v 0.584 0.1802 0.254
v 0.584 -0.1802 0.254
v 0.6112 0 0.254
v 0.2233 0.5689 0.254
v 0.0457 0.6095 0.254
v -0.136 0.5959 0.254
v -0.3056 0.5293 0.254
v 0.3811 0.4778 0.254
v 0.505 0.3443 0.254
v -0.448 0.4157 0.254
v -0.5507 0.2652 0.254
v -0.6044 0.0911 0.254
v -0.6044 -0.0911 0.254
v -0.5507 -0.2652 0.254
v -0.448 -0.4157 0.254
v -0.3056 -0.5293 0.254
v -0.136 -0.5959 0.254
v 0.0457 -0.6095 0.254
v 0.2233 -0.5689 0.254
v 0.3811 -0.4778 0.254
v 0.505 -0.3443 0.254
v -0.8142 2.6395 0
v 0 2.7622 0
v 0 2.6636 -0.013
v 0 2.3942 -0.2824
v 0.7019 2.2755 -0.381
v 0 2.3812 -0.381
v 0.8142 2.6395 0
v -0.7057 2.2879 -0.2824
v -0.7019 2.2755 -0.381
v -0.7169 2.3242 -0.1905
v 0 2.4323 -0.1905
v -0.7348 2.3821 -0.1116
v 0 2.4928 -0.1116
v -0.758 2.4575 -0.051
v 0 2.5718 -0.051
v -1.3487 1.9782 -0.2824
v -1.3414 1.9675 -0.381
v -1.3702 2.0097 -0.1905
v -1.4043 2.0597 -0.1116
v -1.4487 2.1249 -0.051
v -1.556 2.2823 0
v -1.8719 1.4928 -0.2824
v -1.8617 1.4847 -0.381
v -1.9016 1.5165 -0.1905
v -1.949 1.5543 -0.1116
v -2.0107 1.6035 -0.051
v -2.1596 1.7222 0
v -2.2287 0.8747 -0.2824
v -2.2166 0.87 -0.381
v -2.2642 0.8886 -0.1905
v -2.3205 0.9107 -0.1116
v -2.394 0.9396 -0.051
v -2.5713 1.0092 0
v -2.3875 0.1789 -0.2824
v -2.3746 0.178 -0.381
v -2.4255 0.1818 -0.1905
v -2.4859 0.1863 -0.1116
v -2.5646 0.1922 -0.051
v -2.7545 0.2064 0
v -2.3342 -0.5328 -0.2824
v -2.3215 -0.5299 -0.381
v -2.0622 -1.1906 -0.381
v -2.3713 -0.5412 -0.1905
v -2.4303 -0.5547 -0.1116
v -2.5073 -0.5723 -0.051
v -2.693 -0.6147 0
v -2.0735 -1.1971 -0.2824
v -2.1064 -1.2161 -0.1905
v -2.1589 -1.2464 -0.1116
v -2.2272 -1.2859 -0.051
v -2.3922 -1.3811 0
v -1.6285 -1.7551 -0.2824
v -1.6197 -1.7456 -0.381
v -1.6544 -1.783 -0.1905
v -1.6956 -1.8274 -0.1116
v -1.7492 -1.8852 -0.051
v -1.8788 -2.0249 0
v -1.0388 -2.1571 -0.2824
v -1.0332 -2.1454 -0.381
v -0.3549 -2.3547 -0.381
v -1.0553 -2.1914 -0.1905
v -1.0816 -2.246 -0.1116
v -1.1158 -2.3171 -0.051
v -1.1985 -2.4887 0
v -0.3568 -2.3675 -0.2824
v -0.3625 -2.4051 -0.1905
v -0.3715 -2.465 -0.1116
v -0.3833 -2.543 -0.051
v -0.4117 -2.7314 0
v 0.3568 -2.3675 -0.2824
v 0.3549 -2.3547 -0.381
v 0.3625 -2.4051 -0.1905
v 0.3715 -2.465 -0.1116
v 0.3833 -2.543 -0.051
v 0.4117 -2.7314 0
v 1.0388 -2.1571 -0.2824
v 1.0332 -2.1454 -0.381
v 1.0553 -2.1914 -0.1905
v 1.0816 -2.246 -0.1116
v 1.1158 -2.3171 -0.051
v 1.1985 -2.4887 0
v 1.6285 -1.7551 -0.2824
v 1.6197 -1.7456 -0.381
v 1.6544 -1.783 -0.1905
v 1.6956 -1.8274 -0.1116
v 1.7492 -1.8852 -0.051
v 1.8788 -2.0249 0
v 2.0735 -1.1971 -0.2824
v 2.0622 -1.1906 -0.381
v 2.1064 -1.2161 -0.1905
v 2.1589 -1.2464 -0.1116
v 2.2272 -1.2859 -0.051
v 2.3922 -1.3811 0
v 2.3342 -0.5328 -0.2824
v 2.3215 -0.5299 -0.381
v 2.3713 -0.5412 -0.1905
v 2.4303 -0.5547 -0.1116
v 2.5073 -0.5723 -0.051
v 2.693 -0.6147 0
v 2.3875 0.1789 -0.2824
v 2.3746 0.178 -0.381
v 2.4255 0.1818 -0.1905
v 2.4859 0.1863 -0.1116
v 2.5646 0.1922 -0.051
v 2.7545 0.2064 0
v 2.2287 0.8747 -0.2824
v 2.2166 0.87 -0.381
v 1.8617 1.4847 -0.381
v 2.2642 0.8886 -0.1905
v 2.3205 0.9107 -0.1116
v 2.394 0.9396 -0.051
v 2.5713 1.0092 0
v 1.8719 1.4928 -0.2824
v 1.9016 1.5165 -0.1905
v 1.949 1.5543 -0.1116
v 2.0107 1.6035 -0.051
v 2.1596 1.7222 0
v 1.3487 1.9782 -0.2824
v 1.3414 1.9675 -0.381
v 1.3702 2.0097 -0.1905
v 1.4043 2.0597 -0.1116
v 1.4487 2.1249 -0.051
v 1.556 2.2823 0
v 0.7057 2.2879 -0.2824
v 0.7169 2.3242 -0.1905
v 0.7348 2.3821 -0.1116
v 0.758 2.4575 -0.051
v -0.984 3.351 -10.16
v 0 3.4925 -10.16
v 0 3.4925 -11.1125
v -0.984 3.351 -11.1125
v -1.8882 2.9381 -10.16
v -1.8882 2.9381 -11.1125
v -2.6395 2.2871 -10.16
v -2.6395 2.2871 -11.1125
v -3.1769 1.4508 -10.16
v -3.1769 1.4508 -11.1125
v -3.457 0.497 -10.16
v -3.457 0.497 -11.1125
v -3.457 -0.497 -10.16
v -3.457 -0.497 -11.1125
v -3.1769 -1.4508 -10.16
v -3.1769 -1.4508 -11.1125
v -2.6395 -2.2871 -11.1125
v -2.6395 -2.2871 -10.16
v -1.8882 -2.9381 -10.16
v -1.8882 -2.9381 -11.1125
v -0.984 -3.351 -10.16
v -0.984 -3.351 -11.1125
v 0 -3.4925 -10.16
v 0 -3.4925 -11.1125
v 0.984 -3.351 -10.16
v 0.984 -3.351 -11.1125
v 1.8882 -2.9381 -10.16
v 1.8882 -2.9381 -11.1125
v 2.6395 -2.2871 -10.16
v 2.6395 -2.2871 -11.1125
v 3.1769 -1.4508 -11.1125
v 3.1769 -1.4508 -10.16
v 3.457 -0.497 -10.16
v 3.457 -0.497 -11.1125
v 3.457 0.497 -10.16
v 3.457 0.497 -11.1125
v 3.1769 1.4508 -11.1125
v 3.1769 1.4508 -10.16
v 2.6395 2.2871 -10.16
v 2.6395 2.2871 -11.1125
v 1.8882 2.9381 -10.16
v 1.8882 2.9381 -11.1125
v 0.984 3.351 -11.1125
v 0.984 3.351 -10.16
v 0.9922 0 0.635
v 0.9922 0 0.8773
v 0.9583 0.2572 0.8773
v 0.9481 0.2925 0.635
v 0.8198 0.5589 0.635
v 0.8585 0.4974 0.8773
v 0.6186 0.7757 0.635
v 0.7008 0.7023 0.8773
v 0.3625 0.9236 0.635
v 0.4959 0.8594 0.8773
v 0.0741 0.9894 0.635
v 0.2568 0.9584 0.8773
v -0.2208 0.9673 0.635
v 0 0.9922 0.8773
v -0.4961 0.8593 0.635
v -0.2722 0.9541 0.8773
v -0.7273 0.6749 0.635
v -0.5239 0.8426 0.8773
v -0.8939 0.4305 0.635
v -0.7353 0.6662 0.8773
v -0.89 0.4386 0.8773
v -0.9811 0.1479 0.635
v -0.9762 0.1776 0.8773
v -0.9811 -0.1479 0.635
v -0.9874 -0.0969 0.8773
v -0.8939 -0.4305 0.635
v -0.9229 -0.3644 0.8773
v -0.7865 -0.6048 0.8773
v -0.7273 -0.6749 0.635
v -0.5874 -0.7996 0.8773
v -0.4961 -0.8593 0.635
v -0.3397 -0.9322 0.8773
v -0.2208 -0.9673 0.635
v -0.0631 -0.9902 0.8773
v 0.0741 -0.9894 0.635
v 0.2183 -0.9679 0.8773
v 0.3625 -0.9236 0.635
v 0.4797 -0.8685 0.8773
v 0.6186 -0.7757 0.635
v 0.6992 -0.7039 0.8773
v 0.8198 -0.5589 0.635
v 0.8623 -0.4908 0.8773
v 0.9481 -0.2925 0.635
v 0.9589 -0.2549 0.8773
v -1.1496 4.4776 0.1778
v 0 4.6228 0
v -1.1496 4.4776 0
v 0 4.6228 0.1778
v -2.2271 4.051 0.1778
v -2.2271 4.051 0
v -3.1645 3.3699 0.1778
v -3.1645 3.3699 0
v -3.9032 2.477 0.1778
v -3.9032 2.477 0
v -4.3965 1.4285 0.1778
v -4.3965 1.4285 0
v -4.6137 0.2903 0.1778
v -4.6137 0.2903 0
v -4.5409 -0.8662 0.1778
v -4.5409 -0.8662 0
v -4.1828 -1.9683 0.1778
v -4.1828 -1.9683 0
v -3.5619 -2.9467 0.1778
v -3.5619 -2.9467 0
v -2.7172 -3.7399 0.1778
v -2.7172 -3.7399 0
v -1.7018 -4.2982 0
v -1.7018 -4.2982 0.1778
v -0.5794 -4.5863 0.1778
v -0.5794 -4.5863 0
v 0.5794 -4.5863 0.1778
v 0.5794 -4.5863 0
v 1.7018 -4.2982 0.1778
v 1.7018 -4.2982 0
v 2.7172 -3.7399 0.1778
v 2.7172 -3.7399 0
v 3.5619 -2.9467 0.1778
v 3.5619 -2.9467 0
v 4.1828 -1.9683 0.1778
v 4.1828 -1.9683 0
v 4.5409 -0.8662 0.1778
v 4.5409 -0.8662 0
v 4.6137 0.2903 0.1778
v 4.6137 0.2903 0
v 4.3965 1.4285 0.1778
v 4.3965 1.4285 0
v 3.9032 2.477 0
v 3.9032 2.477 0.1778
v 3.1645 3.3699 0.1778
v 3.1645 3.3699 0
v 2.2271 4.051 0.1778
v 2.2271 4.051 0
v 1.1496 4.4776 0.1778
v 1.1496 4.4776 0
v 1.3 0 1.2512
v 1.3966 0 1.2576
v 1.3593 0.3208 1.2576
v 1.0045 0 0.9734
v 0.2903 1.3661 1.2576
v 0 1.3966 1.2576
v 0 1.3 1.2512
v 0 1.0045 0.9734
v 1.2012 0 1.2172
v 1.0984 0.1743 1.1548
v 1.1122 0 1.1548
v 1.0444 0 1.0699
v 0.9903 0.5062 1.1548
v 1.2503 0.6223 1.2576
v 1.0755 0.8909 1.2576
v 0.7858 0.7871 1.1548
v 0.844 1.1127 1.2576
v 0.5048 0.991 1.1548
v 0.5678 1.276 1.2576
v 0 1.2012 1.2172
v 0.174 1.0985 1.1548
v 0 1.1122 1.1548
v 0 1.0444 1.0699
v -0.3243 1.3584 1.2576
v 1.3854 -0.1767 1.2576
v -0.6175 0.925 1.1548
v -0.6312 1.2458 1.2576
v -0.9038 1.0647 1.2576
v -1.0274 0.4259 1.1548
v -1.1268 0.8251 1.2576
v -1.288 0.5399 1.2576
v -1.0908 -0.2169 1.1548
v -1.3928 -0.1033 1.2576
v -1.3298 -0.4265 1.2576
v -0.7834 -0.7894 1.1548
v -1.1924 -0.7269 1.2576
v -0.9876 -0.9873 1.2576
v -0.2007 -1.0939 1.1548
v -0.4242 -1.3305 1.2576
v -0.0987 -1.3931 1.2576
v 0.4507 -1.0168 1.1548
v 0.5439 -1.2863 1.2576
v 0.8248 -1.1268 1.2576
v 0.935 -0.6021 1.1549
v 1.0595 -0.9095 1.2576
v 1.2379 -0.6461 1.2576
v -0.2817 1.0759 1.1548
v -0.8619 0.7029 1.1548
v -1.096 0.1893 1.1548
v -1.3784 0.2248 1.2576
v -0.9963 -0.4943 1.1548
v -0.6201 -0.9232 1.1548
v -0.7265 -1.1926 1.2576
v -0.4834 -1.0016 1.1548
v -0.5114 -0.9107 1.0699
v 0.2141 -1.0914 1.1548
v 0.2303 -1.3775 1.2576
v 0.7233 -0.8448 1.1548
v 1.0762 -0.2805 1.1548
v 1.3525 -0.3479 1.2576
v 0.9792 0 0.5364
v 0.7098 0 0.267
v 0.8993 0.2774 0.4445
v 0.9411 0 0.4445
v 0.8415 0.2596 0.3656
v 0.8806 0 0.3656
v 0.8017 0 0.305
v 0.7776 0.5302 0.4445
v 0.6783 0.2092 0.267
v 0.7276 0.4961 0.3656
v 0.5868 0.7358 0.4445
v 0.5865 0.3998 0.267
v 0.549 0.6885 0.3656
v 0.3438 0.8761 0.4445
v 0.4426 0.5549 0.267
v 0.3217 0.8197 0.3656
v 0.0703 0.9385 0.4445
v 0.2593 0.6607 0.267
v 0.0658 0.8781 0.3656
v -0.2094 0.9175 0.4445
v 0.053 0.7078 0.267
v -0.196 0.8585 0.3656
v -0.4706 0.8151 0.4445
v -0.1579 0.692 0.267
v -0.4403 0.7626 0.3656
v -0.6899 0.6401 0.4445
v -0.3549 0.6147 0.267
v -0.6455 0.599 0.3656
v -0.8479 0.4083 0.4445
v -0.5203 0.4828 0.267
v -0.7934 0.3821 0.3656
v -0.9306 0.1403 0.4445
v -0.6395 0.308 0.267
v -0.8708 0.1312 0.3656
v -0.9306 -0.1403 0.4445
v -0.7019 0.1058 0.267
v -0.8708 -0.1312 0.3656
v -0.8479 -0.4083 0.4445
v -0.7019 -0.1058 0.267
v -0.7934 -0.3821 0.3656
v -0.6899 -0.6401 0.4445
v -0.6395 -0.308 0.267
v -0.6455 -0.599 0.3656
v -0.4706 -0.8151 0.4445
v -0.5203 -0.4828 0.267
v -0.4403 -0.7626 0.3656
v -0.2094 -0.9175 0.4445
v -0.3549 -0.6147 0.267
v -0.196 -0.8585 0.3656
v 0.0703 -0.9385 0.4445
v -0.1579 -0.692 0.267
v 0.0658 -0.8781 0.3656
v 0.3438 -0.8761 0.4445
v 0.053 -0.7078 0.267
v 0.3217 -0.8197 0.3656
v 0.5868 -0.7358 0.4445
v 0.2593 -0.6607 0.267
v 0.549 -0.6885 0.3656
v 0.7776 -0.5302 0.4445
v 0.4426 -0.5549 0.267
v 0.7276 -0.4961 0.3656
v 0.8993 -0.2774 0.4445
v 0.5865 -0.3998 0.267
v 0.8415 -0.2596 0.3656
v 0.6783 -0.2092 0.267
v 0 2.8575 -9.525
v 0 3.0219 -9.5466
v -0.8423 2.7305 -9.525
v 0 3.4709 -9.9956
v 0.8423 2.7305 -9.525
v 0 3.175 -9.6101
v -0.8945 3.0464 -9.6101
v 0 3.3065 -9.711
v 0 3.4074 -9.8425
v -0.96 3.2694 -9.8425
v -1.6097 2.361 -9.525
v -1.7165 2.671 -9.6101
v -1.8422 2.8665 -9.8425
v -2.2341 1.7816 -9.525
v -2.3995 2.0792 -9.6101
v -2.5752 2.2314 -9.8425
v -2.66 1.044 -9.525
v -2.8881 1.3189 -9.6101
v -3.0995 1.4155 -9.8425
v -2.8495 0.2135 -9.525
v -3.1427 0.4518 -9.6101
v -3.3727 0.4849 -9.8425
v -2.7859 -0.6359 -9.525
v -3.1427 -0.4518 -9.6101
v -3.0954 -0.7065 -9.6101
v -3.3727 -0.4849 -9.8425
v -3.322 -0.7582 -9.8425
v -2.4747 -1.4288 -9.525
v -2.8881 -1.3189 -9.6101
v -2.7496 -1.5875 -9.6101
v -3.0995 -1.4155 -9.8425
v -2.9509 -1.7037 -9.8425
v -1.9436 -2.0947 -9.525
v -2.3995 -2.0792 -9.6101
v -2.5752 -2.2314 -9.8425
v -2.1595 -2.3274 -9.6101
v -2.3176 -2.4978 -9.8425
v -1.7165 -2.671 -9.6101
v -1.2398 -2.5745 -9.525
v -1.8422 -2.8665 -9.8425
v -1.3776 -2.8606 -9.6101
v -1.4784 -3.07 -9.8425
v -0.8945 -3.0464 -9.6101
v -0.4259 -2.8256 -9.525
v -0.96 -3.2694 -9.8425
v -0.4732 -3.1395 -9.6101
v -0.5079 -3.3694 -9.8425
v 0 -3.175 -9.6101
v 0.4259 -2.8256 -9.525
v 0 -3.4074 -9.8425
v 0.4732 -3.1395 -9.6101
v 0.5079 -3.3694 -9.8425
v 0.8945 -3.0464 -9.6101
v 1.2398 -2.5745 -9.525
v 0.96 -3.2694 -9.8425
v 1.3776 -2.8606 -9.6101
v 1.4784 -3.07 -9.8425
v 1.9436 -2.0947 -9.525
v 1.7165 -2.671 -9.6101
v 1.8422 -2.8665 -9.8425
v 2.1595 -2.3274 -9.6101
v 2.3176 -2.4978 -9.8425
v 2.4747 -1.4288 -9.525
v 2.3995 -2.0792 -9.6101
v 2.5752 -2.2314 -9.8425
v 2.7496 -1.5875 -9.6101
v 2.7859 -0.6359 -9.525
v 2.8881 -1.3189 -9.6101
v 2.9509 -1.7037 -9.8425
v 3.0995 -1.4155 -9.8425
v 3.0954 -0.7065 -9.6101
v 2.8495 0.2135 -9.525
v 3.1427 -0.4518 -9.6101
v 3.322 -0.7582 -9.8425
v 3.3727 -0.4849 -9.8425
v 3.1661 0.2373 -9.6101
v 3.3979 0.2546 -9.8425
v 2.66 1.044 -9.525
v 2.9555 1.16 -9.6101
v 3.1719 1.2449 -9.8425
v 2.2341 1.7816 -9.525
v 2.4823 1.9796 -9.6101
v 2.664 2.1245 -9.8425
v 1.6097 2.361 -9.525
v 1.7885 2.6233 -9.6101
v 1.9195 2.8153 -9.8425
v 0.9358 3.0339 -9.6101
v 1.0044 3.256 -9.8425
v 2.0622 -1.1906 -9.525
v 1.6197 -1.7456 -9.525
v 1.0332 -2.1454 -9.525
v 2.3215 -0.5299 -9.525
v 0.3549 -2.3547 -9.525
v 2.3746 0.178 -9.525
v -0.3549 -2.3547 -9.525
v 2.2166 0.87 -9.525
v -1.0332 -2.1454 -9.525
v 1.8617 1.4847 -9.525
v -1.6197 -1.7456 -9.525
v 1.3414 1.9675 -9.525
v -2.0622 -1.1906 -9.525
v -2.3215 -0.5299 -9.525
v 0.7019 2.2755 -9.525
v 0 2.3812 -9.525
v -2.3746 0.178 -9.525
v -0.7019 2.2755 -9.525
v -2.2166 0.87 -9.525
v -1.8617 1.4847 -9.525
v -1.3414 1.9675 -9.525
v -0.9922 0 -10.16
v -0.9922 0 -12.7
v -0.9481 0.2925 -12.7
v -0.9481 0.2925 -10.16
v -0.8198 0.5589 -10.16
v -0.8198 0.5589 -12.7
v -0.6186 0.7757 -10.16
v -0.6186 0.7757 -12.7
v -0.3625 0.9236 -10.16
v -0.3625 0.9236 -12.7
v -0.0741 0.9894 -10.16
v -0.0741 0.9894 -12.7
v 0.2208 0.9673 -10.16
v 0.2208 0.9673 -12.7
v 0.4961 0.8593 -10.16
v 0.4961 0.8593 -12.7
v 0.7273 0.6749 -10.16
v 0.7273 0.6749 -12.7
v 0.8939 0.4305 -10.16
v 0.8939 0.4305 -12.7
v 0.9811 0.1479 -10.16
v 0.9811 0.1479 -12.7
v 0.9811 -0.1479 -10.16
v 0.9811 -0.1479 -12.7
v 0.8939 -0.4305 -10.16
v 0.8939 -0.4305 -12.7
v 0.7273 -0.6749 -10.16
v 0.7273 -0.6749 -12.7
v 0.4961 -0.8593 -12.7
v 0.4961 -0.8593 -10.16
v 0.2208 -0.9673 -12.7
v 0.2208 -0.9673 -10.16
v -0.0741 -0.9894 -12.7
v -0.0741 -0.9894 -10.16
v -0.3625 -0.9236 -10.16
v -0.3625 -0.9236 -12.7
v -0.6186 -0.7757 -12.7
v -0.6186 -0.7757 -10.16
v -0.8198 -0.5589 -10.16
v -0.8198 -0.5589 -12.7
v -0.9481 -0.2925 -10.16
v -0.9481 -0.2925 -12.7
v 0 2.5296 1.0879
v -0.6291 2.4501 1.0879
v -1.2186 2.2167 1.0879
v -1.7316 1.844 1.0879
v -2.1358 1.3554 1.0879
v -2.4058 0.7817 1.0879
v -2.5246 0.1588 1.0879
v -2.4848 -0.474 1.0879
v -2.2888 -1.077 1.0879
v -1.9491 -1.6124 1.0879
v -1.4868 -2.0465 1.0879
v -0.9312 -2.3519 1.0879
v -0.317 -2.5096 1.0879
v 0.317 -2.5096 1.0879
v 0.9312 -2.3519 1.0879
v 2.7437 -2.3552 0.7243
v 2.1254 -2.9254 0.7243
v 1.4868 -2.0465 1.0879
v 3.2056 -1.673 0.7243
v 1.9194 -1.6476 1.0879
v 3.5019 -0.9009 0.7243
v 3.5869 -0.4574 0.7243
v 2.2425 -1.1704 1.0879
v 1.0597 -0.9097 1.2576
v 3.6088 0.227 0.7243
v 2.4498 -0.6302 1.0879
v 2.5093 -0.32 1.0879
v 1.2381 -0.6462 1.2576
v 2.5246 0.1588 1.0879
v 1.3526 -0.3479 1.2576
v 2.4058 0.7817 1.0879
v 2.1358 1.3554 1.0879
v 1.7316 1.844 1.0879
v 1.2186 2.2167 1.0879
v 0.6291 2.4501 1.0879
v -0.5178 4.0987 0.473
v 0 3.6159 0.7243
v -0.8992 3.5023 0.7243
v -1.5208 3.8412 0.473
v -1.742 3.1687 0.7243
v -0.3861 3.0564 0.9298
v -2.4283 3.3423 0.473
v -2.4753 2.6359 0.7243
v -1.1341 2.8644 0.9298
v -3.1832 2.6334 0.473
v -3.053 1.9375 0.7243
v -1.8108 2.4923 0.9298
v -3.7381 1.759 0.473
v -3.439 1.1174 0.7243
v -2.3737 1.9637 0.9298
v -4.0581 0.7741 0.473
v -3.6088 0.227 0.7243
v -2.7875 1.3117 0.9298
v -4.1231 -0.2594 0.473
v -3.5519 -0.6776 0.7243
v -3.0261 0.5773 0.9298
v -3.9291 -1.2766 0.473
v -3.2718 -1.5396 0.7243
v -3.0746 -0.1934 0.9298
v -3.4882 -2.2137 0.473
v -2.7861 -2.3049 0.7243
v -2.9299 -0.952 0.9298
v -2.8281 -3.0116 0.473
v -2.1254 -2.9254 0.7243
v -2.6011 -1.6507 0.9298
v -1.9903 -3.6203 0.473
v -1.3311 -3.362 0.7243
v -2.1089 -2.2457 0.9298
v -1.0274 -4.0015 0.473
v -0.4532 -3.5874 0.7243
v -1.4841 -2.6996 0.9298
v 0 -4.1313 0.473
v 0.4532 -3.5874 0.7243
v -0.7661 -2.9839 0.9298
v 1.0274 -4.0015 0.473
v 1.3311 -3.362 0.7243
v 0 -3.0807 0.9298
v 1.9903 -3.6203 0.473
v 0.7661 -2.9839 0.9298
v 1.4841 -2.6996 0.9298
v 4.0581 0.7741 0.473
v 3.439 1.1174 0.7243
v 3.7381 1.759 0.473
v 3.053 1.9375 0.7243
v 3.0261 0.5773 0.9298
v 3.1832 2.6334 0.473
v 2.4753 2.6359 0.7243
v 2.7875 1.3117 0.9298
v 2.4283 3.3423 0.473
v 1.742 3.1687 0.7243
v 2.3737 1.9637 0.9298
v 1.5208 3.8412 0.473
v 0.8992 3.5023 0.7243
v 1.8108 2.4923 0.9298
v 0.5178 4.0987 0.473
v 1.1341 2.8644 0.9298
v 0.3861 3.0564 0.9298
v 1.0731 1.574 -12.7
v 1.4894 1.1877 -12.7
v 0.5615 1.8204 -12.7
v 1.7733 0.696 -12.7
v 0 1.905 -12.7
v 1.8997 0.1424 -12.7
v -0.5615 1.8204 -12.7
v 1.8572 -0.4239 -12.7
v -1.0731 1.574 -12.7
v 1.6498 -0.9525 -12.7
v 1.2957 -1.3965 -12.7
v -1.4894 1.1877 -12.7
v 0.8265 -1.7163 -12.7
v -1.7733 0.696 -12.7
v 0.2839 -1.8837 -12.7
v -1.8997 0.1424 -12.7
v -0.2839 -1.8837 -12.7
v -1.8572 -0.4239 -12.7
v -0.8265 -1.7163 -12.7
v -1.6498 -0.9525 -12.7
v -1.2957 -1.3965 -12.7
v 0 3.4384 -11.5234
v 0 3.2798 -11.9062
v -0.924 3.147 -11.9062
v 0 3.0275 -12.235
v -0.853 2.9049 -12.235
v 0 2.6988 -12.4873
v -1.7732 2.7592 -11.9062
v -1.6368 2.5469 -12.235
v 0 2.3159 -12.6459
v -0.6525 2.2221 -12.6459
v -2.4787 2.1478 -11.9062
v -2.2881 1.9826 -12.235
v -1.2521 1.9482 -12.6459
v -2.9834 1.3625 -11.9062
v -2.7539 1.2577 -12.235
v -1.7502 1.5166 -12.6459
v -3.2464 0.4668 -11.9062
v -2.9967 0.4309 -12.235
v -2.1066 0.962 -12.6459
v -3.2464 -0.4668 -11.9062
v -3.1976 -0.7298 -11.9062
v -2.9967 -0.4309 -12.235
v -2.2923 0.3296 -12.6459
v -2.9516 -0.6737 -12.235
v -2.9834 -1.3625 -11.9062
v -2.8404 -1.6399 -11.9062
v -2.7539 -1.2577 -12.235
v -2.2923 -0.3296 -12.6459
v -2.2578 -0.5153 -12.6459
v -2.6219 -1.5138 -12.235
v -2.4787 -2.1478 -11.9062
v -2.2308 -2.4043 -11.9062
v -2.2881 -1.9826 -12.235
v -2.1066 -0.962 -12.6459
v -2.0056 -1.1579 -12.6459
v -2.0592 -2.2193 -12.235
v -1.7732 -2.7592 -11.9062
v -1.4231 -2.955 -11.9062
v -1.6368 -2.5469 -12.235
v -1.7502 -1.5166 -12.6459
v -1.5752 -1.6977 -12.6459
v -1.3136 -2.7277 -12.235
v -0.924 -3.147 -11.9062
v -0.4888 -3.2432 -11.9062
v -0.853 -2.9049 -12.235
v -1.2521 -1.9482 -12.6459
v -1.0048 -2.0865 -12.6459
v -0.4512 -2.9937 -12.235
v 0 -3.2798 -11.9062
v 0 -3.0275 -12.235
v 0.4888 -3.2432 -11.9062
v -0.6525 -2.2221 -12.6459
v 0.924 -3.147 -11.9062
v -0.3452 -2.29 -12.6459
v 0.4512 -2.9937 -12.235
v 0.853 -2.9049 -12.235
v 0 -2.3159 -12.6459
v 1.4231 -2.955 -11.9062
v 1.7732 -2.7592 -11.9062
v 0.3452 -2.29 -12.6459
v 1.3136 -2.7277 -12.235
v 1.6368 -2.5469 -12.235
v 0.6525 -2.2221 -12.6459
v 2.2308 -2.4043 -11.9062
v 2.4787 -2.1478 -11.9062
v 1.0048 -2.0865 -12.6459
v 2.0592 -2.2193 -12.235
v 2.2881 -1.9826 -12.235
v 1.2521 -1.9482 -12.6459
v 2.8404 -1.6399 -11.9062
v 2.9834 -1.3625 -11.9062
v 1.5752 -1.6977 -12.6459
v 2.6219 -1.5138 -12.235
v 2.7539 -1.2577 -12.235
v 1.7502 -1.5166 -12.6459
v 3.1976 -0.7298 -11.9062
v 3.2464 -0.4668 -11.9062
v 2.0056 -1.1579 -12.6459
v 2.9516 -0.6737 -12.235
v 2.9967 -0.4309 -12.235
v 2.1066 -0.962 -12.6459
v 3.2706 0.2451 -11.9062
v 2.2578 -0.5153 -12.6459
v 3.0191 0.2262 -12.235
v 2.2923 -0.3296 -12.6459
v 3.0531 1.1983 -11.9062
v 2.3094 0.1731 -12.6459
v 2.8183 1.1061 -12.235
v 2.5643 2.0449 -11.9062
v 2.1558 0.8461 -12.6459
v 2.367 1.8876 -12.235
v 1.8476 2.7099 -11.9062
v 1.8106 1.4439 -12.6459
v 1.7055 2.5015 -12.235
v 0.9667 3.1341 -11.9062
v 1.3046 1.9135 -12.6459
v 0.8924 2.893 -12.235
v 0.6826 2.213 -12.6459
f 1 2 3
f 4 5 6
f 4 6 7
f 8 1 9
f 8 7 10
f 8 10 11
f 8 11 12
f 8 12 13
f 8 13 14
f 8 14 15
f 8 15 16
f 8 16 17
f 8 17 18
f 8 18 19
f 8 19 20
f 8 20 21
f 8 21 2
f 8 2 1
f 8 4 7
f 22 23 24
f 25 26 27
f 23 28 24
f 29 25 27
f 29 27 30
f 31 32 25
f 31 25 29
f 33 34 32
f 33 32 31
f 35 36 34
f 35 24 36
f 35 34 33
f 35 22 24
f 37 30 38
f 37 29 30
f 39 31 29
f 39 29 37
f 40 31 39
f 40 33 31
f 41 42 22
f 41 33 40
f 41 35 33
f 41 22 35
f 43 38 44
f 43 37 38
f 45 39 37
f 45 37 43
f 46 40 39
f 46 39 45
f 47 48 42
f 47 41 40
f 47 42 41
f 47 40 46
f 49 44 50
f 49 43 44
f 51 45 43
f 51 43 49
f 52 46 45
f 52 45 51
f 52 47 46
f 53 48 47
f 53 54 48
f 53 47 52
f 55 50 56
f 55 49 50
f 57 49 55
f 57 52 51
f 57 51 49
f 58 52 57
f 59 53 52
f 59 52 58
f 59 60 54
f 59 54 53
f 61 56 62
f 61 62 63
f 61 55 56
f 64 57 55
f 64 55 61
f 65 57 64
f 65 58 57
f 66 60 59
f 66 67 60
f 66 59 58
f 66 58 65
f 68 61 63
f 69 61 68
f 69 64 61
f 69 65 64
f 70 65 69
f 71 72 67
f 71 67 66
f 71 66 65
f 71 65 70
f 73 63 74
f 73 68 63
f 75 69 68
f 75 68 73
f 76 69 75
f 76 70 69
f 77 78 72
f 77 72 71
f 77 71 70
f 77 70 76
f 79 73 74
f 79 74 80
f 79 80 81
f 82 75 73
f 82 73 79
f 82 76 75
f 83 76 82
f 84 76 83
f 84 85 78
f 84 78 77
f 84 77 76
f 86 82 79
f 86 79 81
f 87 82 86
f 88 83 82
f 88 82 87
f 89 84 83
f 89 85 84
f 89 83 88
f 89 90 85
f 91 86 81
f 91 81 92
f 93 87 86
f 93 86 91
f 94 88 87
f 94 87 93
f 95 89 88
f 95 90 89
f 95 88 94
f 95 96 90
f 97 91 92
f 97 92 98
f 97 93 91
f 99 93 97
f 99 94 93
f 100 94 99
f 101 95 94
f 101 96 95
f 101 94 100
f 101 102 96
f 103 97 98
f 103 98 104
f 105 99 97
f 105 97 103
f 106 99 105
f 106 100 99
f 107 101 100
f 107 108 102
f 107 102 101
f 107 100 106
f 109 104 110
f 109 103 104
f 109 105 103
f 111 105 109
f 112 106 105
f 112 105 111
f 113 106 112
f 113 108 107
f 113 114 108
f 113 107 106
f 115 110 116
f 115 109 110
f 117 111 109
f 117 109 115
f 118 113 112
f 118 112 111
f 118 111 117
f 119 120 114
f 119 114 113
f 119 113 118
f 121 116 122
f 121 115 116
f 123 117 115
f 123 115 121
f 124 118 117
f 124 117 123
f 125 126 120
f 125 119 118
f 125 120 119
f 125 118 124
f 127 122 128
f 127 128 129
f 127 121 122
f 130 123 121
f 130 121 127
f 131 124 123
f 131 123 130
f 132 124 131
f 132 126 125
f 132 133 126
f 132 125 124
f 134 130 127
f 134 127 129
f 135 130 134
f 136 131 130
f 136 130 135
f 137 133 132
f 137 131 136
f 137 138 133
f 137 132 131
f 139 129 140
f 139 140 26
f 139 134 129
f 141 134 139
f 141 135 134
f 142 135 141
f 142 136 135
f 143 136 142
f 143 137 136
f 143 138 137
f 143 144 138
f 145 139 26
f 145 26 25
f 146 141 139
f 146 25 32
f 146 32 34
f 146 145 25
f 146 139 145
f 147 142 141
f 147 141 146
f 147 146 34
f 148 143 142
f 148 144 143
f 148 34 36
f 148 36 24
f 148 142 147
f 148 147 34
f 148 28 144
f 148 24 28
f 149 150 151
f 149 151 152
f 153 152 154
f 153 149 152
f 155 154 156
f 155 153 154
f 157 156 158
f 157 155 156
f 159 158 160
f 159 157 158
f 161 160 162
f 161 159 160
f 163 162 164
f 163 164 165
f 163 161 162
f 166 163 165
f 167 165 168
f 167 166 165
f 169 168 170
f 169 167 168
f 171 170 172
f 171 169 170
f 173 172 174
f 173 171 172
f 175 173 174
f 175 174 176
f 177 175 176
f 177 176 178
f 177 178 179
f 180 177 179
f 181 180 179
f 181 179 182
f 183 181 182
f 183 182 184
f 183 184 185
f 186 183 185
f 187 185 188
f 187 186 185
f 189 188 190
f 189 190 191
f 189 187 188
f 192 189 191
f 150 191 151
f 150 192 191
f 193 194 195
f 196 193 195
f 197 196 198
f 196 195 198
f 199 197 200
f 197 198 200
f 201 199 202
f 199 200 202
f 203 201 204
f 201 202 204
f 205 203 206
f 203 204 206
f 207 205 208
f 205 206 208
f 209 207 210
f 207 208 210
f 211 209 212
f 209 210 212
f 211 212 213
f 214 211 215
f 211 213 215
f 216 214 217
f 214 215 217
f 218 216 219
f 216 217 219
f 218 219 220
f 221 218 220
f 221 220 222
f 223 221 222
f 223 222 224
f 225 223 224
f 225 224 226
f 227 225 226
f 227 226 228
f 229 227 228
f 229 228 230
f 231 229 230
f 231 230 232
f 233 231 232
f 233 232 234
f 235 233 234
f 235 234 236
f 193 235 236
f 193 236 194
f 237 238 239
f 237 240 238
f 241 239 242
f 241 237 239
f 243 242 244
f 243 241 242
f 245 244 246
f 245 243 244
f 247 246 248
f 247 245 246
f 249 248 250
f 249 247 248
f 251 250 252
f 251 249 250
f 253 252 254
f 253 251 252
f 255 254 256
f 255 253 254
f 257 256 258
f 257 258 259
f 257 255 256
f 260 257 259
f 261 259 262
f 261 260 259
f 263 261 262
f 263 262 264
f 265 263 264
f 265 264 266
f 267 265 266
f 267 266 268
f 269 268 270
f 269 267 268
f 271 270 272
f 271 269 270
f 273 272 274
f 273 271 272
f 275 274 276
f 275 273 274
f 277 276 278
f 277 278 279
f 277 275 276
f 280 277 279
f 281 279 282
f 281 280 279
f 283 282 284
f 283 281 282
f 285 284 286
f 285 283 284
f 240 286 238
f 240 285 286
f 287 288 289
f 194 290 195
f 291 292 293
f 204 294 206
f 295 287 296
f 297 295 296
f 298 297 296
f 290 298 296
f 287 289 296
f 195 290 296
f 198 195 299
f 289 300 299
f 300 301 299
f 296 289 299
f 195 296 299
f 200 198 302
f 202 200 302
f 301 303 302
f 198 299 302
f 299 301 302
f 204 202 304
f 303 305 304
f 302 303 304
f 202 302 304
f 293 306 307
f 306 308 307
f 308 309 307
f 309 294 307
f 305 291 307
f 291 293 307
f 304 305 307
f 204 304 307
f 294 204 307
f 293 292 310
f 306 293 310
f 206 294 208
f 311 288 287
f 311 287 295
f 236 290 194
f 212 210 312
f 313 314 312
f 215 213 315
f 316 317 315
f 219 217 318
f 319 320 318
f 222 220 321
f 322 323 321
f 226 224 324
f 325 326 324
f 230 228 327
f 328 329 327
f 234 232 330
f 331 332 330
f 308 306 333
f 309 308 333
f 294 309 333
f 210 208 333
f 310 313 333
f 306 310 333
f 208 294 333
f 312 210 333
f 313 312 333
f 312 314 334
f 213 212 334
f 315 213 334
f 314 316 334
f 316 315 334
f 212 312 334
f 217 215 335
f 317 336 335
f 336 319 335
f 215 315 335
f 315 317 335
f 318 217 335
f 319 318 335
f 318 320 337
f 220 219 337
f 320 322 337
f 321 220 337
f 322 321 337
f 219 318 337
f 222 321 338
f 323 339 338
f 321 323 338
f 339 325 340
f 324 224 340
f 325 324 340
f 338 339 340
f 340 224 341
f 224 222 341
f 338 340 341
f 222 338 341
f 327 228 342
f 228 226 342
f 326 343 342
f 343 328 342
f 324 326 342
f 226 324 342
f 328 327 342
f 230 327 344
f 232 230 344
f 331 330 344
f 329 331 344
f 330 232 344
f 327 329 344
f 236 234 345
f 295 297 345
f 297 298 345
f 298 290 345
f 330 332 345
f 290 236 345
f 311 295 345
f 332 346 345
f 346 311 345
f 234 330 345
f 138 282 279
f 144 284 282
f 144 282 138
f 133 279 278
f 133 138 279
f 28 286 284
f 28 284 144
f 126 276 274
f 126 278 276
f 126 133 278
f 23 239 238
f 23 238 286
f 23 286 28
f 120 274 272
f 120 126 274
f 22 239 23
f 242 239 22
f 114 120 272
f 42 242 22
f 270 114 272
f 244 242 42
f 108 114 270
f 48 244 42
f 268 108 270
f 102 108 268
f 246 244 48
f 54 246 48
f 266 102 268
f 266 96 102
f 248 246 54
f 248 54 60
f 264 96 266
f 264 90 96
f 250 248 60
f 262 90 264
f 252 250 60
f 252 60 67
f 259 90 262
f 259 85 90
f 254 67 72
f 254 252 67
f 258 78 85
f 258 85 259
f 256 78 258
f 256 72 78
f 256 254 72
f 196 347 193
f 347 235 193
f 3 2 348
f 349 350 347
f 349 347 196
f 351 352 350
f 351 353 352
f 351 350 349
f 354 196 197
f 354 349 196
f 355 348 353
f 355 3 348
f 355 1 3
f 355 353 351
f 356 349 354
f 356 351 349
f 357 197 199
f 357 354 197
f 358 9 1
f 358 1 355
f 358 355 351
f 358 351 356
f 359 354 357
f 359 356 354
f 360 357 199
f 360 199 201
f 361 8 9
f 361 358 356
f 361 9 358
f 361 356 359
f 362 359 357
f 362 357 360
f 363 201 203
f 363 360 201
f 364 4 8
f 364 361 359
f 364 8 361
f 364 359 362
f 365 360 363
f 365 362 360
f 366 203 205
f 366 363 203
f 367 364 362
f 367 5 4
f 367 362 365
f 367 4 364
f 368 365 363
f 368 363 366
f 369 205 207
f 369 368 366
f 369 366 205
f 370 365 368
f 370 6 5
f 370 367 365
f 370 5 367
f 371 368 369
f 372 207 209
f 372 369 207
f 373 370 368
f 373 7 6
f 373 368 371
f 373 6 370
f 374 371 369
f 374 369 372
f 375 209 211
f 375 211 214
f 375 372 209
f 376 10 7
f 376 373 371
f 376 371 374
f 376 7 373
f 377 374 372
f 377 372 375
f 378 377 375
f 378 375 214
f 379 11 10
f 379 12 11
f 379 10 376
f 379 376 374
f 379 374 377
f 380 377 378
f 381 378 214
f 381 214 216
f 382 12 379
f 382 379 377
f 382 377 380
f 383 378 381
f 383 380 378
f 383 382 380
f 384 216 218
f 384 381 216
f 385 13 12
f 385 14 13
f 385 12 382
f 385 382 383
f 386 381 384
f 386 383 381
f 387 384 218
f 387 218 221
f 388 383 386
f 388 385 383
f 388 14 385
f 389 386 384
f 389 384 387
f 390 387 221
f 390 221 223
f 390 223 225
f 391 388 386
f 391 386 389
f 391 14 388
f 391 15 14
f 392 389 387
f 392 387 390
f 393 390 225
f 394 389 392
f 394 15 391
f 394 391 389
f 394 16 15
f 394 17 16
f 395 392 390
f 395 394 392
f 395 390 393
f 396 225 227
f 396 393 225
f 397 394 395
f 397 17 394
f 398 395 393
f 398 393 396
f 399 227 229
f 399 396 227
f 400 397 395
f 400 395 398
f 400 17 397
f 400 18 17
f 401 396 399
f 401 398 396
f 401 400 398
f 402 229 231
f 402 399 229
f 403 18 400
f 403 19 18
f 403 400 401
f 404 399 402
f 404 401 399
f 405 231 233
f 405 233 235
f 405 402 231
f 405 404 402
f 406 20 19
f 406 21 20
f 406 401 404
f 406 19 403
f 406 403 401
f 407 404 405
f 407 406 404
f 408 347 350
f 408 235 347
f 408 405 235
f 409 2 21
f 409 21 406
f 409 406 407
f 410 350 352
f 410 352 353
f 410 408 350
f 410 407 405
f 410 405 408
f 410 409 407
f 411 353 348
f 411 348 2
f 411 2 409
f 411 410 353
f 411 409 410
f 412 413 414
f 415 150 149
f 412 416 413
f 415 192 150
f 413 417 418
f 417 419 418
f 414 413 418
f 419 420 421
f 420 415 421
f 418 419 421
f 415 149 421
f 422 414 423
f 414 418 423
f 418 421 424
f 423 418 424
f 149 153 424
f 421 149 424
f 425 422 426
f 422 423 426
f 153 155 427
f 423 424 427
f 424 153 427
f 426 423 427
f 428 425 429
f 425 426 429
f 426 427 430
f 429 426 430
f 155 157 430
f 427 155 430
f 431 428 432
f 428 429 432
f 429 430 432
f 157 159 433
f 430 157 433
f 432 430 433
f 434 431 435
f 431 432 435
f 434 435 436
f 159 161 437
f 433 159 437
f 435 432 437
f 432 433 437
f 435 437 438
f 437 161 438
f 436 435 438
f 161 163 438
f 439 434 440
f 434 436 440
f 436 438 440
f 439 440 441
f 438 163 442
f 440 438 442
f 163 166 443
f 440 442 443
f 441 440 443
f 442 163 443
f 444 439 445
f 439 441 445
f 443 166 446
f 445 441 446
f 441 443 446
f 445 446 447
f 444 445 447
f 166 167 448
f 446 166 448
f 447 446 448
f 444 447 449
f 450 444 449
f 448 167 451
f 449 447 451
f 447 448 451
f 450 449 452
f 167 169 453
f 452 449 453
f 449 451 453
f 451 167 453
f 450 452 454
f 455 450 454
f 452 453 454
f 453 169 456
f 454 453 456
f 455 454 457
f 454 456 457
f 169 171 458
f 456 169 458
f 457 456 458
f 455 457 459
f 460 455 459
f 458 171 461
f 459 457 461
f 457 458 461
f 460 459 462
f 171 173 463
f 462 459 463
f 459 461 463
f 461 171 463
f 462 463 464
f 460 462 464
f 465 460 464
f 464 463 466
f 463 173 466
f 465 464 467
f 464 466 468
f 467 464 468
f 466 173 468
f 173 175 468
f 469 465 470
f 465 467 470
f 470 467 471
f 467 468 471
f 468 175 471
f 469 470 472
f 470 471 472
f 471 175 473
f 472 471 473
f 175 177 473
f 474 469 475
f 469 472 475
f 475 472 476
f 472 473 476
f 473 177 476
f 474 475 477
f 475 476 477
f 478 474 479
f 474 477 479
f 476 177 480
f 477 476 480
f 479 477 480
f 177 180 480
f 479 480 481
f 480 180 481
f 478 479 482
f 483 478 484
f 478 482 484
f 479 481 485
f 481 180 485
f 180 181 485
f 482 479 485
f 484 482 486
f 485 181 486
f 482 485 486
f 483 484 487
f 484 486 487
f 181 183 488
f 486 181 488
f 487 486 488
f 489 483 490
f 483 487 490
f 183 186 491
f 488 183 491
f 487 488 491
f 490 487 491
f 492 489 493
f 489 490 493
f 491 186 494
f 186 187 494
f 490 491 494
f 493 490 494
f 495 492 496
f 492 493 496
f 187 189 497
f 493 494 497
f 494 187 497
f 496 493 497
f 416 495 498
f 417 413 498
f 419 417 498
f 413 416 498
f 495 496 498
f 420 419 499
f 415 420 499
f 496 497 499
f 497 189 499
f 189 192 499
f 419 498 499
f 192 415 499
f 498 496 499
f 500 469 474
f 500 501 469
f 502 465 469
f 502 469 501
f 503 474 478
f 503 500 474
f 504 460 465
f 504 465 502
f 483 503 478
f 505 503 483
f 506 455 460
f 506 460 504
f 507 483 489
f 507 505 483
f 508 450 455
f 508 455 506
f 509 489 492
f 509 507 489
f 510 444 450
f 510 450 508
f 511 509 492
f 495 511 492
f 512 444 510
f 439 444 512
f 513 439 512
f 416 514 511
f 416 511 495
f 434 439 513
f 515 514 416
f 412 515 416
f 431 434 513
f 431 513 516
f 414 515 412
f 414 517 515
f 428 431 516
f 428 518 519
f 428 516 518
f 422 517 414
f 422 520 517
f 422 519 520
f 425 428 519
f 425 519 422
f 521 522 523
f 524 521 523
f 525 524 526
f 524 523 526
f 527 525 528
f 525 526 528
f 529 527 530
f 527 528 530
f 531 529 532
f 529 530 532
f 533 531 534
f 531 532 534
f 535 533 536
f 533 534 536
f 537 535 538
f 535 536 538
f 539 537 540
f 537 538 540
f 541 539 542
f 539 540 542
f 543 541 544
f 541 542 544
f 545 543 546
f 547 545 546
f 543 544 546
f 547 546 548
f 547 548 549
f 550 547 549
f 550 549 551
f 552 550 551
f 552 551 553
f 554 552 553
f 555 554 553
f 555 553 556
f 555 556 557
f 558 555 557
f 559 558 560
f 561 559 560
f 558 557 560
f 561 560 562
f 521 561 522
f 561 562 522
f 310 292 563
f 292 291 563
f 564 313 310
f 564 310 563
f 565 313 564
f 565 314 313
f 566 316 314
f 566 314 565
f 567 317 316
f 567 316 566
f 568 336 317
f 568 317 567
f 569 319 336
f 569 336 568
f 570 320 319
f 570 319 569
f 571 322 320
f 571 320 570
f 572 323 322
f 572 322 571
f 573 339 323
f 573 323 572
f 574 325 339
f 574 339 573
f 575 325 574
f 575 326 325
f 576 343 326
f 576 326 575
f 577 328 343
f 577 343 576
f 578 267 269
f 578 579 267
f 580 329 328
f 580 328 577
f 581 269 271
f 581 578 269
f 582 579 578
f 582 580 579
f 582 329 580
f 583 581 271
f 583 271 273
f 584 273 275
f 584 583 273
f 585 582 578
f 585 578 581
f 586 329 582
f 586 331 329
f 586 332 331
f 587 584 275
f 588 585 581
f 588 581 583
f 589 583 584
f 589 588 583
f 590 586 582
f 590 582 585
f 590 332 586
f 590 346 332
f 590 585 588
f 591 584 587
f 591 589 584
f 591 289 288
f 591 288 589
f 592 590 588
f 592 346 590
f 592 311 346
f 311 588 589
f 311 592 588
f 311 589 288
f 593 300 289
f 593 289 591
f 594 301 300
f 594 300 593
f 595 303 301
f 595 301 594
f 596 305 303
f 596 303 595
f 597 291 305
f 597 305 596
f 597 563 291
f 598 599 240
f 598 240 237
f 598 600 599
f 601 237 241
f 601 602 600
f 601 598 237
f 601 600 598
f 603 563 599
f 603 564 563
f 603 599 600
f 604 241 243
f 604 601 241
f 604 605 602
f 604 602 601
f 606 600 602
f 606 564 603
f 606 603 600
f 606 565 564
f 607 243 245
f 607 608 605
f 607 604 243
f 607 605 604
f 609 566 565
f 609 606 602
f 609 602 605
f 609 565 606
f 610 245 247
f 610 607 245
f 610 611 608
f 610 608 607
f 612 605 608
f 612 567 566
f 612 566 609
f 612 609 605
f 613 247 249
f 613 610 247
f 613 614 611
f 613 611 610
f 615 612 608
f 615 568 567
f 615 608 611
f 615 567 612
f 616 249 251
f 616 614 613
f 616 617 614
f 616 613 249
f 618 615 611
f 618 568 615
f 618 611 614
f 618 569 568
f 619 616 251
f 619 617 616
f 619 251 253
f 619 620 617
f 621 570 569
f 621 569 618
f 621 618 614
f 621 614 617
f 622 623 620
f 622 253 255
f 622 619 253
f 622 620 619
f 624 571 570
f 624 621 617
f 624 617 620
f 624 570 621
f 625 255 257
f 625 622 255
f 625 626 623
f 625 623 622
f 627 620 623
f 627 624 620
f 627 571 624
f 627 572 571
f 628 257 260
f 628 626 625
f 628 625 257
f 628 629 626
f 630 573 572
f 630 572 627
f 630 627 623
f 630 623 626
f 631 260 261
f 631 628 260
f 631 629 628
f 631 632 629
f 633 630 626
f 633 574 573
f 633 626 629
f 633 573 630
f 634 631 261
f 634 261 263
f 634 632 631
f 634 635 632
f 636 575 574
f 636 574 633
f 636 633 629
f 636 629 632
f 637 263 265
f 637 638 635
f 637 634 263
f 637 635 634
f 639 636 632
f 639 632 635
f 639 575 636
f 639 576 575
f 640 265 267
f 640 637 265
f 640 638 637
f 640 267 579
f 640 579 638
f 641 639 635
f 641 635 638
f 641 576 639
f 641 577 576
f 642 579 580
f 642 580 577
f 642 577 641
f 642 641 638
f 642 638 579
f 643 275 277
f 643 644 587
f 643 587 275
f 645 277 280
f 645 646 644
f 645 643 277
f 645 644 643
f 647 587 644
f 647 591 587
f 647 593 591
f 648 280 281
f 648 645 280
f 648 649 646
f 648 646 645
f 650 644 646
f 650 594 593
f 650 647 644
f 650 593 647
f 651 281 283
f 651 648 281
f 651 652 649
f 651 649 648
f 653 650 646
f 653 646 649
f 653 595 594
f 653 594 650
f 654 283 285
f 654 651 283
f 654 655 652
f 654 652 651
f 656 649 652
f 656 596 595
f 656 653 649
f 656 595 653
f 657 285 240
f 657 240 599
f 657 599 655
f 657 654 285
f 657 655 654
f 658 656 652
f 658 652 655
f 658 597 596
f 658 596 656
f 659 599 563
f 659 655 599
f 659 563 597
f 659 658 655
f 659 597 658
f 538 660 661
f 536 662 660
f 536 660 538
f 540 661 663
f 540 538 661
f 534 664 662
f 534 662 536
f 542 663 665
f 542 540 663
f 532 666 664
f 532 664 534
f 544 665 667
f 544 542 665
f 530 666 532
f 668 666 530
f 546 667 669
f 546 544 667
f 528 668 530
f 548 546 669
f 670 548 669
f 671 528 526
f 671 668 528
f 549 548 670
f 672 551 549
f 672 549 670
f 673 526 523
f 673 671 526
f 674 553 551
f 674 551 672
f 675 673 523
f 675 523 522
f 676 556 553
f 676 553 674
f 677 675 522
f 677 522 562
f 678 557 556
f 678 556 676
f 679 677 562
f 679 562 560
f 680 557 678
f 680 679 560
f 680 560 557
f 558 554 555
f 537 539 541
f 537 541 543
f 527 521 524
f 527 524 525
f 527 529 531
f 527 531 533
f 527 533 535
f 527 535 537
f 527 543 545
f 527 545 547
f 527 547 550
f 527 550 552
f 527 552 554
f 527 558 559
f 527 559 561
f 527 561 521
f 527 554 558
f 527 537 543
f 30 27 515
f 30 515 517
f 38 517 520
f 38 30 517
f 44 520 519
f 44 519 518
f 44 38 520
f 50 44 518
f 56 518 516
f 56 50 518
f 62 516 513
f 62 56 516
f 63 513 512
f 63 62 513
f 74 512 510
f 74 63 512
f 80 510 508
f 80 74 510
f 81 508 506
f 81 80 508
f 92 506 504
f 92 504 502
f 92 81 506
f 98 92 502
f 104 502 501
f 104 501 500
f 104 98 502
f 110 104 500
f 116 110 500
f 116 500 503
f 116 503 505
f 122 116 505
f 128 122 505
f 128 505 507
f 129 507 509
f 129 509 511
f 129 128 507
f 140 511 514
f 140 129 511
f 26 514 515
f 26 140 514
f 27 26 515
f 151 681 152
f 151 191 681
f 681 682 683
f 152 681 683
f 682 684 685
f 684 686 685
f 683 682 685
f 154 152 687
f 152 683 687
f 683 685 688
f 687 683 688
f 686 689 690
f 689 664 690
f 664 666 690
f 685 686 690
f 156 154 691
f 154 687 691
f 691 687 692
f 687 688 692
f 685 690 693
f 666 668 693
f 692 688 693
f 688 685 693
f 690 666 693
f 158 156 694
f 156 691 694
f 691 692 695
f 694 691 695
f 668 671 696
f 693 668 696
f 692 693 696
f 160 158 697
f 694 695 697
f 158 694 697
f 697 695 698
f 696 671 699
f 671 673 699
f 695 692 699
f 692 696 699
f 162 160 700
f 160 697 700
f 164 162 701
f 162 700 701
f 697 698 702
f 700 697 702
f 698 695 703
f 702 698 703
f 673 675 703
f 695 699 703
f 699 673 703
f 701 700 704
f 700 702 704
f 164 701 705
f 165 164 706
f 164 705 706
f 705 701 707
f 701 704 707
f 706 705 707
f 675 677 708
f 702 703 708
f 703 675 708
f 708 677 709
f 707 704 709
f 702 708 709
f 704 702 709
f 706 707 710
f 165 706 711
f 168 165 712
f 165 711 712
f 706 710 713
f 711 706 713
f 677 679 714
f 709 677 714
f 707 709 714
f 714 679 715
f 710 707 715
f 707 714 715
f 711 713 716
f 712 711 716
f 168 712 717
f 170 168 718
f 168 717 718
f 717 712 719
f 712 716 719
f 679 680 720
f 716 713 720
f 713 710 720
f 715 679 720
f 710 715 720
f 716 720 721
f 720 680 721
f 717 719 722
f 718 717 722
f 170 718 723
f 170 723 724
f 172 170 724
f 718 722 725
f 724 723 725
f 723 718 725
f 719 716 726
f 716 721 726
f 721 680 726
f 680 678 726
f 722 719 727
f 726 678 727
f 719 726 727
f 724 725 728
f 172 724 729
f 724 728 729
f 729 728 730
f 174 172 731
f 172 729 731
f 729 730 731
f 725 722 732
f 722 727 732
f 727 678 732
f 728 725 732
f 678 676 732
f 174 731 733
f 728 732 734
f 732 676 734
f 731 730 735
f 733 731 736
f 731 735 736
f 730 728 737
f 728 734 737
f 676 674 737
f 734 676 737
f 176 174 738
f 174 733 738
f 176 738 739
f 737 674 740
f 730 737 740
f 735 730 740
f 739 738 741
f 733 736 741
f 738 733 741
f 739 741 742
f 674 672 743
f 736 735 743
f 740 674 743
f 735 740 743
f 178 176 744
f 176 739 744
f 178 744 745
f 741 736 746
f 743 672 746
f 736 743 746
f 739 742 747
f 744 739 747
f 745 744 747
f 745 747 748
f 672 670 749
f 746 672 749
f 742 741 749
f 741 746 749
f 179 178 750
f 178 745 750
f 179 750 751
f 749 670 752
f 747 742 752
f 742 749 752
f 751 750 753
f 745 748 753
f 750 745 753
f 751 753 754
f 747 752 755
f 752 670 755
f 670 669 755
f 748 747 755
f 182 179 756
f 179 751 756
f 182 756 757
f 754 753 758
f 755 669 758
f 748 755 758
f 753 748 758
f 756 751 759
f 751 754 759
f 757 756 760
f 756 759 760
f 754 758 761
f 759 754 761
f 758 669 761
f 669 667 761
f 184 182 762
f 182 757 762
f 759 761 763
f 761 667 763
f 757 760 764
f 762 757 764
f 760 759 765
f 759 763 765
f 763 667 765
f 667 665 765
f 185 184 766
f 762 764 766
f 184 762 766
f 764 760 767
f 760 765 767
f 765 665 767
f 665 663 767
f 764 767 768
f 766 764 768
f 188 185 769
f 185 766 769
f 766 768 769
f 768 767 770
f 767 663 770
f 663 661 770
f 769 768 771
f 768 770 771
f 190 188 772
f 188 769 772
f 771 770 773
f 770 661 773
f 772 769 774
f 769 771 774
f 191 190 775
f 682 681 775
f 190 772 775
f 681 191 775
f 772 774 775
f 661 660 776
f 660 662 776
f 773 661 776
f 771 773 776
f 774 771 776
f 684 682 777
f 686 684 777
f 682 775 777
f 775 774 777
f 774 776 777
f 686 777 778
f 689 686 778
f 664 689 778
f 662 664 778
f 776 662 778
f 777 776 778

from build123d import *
from OCP.BRepFilletAPI import BRepFilletAPI_MakeFillet

# Parameters (mm, degrees)
SKETCH4_R          = 0.9921875
CUT_EXTRUDE1_DEPTH = 1.016
CUT_EXTRUDE2_START = -2.54
SKETCH3_R          = 0.9921875
CUT_EXTRUDE2_DEPTH = 2.54
FILLET1_R1         = 0.635
FILLET1_R2         = 1.5875
FILLET1_R3         = 0.381


with BuildPart() as part:
    # Sketch2 → Revolve1 (revolve)
    with BuildSketch(Plane(origin=(0, 0, 0), x_dir=(0, 0, -1), z_dir=(1, 0, 0))):
        with BuildLine():
            Line((-1.27, 0.9921875), (-1.27, 0))
            Line((-1.27, 0), (9.525, 0))
            Line((9.525, 0), (12.7, 0))
            Line((12.7, 0), (12.7, 3.4925))
            Line((12.7, 3.4925), (9.525, 3.4925))
            Line((9.525, 3.4925), (9.525, 2.38125))
            Line((9.525, 2.38125), (0, 2.38125))
            Line((0, 2.38125), (0, 4.6228))
            Line((0, 4.6228), (-0.1778, 4.6228))
            ThreePointArc((-0.1778, 4.6228), (-0.991036966, 2.887856773), (-1.27, 0.9921875))
        make_face()
    revolve(axis=Axis((0, 0, 7.600580616), (0, 0, 1)))

    # Sketch4 → Cut-Extrude1 (cut)
    with BuildSketch(Plane.XY.offset(1.27)):
        Circle(SKETCH4_R)
    extrude(amount=-CUT_EXTRUDE1_DEPTH, mode=Mode.SUBTRACT)

    # Sketch3 → Cut-Extrude2 (cut)
    with BuildSketch(Plane(origin=(0, 0, -12.7), x_dir=(-1, 0, 0), z_dir=(0, 0, -1)).offset(CUT_EXTRUDE2_START)):
        Circle(SKETCH3_R)
    extrude(amount=CUT_EXTRUDE2_DEPTH, mode=Mode.SUBTRACT)

    # Fillet1: one fillet with a radius per group of edges: ONE call of the kernel's fillet builder (fillet() takes one radius for all edges)
    fillet1_edges_1 = [part.edges().sort_by_distance(p)[0] for p in [
        (0, -3.4925, -9.525),
    ]]
    fillet1_edges_2 = [part.edges().sort_by_distance(p)[0] for p in [
        (0, -3.4925, -12.7),
    ]]
    fillet1_edges_3 = [part.edges().sort_by_distance(p)[0] for p in [
        (0, -2.38125, 0),
        (-0.701582509, -0.701582509, 1.27),
        (-0.9921875, 0, 0.254),
    ]]
    fillet1 = BRepFilletAPI_MakeFillet(part.part.solid().wrapped)
    for e in fillet1_edges_1:
        fillet1.Add(FILLET1_R1, e.wrapped)
    for e in fillet1_edges_2:
        fillet1.Add(FILLET1_R2, e.wrapped)
    for e in fillet1_edges_3:
        fillet1.Add(FILLET1_R3, e.wrapped)
    add(Compound.cast(fillet1.Shape()), mode=Mode.REPLACE)


solid = part.part
